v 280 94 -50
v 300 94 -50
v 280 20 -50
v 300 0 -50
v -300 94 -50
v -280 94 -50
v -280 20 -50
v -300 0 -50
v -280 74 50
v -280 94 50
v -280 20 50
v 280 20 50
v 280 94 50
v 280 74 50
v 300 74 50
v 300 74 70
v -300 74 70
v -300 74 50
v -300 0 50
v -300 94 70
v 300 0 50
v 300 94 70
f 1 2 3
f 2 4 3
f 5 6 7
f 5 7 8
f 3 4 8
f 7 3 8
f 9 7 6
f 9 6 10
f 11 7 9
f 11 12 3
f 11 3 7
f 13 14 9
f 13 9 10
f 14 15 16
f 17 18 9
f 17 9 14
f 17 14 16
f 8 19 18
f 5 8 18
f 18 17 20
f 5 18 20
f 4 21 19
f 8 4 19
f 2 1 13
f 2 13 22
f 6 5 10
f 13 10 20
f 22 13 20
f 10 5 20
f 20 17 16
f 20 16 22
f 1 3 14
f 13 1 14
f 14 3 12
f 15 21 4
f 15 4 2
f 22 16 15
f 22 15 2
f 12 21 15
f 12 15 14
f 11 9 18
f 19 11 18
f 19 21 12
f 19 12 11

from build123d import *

# Parameters (mm, degrees)
SKETCH_1_W           = 600
SKETCH_1_H           = 100
EXTRUDE_1_DEPTH      = 20
SKETCH_2_W           = 20
SKETCH_2_H           = 100
EXTRUDE_2_DEPTH      = 74
EXTRUDE_3_DEPTH      = 300
EXTRUDE_3_DEPTH_BACK = 300
SKETCH_3_W           = 20
SKETCH_3_H           = 20


with BuildPart() as part:
    # Эскиз1 → Выдавливание1 (new body)
    with BuildSketch(Plane(origin=(0, 0, 0), x_dir=(-1, 0, 0), z_dir=(0, 1, 0))):
        Rectangle(SKETCH_1_W, SKETCH_1_H)
    extrude(amount=EXTRUDE_1_DEPTH)

    # Эскиз2 → Выдавливание2 (add)
    with BuildSketch(Plane(origin=(0, 20, 0), x_dir=(-1, 0, 0), z_dir=(0, 1, 0))):
        with Locations((-290, 0)):
            Rectangle(SKETCH_2_W, SKETCH_2_H)
        with Locations((290, 0)):
            Rectangle(SKETCH_2_W, SKETCH_2_H)
    extrude(amount=EXTRUDE_2_DEPTH)

    # Эскиз3 → Выдавливание3 (add, two sides: drawn at the far end of the back side and taken through both)
    with BuildSketch(Plane.YZ.offset(-EXTRUDE_3_DEPTH_BACK)):
        with Locations((84, 60)):
            Rectangle(SKETCH_3_W, SKETCH_3_H)
    extrude(amount=EXTRUDE_3_DEPTH + EXTRUDE_3_DEPTH_BACK)


solid = part.part
